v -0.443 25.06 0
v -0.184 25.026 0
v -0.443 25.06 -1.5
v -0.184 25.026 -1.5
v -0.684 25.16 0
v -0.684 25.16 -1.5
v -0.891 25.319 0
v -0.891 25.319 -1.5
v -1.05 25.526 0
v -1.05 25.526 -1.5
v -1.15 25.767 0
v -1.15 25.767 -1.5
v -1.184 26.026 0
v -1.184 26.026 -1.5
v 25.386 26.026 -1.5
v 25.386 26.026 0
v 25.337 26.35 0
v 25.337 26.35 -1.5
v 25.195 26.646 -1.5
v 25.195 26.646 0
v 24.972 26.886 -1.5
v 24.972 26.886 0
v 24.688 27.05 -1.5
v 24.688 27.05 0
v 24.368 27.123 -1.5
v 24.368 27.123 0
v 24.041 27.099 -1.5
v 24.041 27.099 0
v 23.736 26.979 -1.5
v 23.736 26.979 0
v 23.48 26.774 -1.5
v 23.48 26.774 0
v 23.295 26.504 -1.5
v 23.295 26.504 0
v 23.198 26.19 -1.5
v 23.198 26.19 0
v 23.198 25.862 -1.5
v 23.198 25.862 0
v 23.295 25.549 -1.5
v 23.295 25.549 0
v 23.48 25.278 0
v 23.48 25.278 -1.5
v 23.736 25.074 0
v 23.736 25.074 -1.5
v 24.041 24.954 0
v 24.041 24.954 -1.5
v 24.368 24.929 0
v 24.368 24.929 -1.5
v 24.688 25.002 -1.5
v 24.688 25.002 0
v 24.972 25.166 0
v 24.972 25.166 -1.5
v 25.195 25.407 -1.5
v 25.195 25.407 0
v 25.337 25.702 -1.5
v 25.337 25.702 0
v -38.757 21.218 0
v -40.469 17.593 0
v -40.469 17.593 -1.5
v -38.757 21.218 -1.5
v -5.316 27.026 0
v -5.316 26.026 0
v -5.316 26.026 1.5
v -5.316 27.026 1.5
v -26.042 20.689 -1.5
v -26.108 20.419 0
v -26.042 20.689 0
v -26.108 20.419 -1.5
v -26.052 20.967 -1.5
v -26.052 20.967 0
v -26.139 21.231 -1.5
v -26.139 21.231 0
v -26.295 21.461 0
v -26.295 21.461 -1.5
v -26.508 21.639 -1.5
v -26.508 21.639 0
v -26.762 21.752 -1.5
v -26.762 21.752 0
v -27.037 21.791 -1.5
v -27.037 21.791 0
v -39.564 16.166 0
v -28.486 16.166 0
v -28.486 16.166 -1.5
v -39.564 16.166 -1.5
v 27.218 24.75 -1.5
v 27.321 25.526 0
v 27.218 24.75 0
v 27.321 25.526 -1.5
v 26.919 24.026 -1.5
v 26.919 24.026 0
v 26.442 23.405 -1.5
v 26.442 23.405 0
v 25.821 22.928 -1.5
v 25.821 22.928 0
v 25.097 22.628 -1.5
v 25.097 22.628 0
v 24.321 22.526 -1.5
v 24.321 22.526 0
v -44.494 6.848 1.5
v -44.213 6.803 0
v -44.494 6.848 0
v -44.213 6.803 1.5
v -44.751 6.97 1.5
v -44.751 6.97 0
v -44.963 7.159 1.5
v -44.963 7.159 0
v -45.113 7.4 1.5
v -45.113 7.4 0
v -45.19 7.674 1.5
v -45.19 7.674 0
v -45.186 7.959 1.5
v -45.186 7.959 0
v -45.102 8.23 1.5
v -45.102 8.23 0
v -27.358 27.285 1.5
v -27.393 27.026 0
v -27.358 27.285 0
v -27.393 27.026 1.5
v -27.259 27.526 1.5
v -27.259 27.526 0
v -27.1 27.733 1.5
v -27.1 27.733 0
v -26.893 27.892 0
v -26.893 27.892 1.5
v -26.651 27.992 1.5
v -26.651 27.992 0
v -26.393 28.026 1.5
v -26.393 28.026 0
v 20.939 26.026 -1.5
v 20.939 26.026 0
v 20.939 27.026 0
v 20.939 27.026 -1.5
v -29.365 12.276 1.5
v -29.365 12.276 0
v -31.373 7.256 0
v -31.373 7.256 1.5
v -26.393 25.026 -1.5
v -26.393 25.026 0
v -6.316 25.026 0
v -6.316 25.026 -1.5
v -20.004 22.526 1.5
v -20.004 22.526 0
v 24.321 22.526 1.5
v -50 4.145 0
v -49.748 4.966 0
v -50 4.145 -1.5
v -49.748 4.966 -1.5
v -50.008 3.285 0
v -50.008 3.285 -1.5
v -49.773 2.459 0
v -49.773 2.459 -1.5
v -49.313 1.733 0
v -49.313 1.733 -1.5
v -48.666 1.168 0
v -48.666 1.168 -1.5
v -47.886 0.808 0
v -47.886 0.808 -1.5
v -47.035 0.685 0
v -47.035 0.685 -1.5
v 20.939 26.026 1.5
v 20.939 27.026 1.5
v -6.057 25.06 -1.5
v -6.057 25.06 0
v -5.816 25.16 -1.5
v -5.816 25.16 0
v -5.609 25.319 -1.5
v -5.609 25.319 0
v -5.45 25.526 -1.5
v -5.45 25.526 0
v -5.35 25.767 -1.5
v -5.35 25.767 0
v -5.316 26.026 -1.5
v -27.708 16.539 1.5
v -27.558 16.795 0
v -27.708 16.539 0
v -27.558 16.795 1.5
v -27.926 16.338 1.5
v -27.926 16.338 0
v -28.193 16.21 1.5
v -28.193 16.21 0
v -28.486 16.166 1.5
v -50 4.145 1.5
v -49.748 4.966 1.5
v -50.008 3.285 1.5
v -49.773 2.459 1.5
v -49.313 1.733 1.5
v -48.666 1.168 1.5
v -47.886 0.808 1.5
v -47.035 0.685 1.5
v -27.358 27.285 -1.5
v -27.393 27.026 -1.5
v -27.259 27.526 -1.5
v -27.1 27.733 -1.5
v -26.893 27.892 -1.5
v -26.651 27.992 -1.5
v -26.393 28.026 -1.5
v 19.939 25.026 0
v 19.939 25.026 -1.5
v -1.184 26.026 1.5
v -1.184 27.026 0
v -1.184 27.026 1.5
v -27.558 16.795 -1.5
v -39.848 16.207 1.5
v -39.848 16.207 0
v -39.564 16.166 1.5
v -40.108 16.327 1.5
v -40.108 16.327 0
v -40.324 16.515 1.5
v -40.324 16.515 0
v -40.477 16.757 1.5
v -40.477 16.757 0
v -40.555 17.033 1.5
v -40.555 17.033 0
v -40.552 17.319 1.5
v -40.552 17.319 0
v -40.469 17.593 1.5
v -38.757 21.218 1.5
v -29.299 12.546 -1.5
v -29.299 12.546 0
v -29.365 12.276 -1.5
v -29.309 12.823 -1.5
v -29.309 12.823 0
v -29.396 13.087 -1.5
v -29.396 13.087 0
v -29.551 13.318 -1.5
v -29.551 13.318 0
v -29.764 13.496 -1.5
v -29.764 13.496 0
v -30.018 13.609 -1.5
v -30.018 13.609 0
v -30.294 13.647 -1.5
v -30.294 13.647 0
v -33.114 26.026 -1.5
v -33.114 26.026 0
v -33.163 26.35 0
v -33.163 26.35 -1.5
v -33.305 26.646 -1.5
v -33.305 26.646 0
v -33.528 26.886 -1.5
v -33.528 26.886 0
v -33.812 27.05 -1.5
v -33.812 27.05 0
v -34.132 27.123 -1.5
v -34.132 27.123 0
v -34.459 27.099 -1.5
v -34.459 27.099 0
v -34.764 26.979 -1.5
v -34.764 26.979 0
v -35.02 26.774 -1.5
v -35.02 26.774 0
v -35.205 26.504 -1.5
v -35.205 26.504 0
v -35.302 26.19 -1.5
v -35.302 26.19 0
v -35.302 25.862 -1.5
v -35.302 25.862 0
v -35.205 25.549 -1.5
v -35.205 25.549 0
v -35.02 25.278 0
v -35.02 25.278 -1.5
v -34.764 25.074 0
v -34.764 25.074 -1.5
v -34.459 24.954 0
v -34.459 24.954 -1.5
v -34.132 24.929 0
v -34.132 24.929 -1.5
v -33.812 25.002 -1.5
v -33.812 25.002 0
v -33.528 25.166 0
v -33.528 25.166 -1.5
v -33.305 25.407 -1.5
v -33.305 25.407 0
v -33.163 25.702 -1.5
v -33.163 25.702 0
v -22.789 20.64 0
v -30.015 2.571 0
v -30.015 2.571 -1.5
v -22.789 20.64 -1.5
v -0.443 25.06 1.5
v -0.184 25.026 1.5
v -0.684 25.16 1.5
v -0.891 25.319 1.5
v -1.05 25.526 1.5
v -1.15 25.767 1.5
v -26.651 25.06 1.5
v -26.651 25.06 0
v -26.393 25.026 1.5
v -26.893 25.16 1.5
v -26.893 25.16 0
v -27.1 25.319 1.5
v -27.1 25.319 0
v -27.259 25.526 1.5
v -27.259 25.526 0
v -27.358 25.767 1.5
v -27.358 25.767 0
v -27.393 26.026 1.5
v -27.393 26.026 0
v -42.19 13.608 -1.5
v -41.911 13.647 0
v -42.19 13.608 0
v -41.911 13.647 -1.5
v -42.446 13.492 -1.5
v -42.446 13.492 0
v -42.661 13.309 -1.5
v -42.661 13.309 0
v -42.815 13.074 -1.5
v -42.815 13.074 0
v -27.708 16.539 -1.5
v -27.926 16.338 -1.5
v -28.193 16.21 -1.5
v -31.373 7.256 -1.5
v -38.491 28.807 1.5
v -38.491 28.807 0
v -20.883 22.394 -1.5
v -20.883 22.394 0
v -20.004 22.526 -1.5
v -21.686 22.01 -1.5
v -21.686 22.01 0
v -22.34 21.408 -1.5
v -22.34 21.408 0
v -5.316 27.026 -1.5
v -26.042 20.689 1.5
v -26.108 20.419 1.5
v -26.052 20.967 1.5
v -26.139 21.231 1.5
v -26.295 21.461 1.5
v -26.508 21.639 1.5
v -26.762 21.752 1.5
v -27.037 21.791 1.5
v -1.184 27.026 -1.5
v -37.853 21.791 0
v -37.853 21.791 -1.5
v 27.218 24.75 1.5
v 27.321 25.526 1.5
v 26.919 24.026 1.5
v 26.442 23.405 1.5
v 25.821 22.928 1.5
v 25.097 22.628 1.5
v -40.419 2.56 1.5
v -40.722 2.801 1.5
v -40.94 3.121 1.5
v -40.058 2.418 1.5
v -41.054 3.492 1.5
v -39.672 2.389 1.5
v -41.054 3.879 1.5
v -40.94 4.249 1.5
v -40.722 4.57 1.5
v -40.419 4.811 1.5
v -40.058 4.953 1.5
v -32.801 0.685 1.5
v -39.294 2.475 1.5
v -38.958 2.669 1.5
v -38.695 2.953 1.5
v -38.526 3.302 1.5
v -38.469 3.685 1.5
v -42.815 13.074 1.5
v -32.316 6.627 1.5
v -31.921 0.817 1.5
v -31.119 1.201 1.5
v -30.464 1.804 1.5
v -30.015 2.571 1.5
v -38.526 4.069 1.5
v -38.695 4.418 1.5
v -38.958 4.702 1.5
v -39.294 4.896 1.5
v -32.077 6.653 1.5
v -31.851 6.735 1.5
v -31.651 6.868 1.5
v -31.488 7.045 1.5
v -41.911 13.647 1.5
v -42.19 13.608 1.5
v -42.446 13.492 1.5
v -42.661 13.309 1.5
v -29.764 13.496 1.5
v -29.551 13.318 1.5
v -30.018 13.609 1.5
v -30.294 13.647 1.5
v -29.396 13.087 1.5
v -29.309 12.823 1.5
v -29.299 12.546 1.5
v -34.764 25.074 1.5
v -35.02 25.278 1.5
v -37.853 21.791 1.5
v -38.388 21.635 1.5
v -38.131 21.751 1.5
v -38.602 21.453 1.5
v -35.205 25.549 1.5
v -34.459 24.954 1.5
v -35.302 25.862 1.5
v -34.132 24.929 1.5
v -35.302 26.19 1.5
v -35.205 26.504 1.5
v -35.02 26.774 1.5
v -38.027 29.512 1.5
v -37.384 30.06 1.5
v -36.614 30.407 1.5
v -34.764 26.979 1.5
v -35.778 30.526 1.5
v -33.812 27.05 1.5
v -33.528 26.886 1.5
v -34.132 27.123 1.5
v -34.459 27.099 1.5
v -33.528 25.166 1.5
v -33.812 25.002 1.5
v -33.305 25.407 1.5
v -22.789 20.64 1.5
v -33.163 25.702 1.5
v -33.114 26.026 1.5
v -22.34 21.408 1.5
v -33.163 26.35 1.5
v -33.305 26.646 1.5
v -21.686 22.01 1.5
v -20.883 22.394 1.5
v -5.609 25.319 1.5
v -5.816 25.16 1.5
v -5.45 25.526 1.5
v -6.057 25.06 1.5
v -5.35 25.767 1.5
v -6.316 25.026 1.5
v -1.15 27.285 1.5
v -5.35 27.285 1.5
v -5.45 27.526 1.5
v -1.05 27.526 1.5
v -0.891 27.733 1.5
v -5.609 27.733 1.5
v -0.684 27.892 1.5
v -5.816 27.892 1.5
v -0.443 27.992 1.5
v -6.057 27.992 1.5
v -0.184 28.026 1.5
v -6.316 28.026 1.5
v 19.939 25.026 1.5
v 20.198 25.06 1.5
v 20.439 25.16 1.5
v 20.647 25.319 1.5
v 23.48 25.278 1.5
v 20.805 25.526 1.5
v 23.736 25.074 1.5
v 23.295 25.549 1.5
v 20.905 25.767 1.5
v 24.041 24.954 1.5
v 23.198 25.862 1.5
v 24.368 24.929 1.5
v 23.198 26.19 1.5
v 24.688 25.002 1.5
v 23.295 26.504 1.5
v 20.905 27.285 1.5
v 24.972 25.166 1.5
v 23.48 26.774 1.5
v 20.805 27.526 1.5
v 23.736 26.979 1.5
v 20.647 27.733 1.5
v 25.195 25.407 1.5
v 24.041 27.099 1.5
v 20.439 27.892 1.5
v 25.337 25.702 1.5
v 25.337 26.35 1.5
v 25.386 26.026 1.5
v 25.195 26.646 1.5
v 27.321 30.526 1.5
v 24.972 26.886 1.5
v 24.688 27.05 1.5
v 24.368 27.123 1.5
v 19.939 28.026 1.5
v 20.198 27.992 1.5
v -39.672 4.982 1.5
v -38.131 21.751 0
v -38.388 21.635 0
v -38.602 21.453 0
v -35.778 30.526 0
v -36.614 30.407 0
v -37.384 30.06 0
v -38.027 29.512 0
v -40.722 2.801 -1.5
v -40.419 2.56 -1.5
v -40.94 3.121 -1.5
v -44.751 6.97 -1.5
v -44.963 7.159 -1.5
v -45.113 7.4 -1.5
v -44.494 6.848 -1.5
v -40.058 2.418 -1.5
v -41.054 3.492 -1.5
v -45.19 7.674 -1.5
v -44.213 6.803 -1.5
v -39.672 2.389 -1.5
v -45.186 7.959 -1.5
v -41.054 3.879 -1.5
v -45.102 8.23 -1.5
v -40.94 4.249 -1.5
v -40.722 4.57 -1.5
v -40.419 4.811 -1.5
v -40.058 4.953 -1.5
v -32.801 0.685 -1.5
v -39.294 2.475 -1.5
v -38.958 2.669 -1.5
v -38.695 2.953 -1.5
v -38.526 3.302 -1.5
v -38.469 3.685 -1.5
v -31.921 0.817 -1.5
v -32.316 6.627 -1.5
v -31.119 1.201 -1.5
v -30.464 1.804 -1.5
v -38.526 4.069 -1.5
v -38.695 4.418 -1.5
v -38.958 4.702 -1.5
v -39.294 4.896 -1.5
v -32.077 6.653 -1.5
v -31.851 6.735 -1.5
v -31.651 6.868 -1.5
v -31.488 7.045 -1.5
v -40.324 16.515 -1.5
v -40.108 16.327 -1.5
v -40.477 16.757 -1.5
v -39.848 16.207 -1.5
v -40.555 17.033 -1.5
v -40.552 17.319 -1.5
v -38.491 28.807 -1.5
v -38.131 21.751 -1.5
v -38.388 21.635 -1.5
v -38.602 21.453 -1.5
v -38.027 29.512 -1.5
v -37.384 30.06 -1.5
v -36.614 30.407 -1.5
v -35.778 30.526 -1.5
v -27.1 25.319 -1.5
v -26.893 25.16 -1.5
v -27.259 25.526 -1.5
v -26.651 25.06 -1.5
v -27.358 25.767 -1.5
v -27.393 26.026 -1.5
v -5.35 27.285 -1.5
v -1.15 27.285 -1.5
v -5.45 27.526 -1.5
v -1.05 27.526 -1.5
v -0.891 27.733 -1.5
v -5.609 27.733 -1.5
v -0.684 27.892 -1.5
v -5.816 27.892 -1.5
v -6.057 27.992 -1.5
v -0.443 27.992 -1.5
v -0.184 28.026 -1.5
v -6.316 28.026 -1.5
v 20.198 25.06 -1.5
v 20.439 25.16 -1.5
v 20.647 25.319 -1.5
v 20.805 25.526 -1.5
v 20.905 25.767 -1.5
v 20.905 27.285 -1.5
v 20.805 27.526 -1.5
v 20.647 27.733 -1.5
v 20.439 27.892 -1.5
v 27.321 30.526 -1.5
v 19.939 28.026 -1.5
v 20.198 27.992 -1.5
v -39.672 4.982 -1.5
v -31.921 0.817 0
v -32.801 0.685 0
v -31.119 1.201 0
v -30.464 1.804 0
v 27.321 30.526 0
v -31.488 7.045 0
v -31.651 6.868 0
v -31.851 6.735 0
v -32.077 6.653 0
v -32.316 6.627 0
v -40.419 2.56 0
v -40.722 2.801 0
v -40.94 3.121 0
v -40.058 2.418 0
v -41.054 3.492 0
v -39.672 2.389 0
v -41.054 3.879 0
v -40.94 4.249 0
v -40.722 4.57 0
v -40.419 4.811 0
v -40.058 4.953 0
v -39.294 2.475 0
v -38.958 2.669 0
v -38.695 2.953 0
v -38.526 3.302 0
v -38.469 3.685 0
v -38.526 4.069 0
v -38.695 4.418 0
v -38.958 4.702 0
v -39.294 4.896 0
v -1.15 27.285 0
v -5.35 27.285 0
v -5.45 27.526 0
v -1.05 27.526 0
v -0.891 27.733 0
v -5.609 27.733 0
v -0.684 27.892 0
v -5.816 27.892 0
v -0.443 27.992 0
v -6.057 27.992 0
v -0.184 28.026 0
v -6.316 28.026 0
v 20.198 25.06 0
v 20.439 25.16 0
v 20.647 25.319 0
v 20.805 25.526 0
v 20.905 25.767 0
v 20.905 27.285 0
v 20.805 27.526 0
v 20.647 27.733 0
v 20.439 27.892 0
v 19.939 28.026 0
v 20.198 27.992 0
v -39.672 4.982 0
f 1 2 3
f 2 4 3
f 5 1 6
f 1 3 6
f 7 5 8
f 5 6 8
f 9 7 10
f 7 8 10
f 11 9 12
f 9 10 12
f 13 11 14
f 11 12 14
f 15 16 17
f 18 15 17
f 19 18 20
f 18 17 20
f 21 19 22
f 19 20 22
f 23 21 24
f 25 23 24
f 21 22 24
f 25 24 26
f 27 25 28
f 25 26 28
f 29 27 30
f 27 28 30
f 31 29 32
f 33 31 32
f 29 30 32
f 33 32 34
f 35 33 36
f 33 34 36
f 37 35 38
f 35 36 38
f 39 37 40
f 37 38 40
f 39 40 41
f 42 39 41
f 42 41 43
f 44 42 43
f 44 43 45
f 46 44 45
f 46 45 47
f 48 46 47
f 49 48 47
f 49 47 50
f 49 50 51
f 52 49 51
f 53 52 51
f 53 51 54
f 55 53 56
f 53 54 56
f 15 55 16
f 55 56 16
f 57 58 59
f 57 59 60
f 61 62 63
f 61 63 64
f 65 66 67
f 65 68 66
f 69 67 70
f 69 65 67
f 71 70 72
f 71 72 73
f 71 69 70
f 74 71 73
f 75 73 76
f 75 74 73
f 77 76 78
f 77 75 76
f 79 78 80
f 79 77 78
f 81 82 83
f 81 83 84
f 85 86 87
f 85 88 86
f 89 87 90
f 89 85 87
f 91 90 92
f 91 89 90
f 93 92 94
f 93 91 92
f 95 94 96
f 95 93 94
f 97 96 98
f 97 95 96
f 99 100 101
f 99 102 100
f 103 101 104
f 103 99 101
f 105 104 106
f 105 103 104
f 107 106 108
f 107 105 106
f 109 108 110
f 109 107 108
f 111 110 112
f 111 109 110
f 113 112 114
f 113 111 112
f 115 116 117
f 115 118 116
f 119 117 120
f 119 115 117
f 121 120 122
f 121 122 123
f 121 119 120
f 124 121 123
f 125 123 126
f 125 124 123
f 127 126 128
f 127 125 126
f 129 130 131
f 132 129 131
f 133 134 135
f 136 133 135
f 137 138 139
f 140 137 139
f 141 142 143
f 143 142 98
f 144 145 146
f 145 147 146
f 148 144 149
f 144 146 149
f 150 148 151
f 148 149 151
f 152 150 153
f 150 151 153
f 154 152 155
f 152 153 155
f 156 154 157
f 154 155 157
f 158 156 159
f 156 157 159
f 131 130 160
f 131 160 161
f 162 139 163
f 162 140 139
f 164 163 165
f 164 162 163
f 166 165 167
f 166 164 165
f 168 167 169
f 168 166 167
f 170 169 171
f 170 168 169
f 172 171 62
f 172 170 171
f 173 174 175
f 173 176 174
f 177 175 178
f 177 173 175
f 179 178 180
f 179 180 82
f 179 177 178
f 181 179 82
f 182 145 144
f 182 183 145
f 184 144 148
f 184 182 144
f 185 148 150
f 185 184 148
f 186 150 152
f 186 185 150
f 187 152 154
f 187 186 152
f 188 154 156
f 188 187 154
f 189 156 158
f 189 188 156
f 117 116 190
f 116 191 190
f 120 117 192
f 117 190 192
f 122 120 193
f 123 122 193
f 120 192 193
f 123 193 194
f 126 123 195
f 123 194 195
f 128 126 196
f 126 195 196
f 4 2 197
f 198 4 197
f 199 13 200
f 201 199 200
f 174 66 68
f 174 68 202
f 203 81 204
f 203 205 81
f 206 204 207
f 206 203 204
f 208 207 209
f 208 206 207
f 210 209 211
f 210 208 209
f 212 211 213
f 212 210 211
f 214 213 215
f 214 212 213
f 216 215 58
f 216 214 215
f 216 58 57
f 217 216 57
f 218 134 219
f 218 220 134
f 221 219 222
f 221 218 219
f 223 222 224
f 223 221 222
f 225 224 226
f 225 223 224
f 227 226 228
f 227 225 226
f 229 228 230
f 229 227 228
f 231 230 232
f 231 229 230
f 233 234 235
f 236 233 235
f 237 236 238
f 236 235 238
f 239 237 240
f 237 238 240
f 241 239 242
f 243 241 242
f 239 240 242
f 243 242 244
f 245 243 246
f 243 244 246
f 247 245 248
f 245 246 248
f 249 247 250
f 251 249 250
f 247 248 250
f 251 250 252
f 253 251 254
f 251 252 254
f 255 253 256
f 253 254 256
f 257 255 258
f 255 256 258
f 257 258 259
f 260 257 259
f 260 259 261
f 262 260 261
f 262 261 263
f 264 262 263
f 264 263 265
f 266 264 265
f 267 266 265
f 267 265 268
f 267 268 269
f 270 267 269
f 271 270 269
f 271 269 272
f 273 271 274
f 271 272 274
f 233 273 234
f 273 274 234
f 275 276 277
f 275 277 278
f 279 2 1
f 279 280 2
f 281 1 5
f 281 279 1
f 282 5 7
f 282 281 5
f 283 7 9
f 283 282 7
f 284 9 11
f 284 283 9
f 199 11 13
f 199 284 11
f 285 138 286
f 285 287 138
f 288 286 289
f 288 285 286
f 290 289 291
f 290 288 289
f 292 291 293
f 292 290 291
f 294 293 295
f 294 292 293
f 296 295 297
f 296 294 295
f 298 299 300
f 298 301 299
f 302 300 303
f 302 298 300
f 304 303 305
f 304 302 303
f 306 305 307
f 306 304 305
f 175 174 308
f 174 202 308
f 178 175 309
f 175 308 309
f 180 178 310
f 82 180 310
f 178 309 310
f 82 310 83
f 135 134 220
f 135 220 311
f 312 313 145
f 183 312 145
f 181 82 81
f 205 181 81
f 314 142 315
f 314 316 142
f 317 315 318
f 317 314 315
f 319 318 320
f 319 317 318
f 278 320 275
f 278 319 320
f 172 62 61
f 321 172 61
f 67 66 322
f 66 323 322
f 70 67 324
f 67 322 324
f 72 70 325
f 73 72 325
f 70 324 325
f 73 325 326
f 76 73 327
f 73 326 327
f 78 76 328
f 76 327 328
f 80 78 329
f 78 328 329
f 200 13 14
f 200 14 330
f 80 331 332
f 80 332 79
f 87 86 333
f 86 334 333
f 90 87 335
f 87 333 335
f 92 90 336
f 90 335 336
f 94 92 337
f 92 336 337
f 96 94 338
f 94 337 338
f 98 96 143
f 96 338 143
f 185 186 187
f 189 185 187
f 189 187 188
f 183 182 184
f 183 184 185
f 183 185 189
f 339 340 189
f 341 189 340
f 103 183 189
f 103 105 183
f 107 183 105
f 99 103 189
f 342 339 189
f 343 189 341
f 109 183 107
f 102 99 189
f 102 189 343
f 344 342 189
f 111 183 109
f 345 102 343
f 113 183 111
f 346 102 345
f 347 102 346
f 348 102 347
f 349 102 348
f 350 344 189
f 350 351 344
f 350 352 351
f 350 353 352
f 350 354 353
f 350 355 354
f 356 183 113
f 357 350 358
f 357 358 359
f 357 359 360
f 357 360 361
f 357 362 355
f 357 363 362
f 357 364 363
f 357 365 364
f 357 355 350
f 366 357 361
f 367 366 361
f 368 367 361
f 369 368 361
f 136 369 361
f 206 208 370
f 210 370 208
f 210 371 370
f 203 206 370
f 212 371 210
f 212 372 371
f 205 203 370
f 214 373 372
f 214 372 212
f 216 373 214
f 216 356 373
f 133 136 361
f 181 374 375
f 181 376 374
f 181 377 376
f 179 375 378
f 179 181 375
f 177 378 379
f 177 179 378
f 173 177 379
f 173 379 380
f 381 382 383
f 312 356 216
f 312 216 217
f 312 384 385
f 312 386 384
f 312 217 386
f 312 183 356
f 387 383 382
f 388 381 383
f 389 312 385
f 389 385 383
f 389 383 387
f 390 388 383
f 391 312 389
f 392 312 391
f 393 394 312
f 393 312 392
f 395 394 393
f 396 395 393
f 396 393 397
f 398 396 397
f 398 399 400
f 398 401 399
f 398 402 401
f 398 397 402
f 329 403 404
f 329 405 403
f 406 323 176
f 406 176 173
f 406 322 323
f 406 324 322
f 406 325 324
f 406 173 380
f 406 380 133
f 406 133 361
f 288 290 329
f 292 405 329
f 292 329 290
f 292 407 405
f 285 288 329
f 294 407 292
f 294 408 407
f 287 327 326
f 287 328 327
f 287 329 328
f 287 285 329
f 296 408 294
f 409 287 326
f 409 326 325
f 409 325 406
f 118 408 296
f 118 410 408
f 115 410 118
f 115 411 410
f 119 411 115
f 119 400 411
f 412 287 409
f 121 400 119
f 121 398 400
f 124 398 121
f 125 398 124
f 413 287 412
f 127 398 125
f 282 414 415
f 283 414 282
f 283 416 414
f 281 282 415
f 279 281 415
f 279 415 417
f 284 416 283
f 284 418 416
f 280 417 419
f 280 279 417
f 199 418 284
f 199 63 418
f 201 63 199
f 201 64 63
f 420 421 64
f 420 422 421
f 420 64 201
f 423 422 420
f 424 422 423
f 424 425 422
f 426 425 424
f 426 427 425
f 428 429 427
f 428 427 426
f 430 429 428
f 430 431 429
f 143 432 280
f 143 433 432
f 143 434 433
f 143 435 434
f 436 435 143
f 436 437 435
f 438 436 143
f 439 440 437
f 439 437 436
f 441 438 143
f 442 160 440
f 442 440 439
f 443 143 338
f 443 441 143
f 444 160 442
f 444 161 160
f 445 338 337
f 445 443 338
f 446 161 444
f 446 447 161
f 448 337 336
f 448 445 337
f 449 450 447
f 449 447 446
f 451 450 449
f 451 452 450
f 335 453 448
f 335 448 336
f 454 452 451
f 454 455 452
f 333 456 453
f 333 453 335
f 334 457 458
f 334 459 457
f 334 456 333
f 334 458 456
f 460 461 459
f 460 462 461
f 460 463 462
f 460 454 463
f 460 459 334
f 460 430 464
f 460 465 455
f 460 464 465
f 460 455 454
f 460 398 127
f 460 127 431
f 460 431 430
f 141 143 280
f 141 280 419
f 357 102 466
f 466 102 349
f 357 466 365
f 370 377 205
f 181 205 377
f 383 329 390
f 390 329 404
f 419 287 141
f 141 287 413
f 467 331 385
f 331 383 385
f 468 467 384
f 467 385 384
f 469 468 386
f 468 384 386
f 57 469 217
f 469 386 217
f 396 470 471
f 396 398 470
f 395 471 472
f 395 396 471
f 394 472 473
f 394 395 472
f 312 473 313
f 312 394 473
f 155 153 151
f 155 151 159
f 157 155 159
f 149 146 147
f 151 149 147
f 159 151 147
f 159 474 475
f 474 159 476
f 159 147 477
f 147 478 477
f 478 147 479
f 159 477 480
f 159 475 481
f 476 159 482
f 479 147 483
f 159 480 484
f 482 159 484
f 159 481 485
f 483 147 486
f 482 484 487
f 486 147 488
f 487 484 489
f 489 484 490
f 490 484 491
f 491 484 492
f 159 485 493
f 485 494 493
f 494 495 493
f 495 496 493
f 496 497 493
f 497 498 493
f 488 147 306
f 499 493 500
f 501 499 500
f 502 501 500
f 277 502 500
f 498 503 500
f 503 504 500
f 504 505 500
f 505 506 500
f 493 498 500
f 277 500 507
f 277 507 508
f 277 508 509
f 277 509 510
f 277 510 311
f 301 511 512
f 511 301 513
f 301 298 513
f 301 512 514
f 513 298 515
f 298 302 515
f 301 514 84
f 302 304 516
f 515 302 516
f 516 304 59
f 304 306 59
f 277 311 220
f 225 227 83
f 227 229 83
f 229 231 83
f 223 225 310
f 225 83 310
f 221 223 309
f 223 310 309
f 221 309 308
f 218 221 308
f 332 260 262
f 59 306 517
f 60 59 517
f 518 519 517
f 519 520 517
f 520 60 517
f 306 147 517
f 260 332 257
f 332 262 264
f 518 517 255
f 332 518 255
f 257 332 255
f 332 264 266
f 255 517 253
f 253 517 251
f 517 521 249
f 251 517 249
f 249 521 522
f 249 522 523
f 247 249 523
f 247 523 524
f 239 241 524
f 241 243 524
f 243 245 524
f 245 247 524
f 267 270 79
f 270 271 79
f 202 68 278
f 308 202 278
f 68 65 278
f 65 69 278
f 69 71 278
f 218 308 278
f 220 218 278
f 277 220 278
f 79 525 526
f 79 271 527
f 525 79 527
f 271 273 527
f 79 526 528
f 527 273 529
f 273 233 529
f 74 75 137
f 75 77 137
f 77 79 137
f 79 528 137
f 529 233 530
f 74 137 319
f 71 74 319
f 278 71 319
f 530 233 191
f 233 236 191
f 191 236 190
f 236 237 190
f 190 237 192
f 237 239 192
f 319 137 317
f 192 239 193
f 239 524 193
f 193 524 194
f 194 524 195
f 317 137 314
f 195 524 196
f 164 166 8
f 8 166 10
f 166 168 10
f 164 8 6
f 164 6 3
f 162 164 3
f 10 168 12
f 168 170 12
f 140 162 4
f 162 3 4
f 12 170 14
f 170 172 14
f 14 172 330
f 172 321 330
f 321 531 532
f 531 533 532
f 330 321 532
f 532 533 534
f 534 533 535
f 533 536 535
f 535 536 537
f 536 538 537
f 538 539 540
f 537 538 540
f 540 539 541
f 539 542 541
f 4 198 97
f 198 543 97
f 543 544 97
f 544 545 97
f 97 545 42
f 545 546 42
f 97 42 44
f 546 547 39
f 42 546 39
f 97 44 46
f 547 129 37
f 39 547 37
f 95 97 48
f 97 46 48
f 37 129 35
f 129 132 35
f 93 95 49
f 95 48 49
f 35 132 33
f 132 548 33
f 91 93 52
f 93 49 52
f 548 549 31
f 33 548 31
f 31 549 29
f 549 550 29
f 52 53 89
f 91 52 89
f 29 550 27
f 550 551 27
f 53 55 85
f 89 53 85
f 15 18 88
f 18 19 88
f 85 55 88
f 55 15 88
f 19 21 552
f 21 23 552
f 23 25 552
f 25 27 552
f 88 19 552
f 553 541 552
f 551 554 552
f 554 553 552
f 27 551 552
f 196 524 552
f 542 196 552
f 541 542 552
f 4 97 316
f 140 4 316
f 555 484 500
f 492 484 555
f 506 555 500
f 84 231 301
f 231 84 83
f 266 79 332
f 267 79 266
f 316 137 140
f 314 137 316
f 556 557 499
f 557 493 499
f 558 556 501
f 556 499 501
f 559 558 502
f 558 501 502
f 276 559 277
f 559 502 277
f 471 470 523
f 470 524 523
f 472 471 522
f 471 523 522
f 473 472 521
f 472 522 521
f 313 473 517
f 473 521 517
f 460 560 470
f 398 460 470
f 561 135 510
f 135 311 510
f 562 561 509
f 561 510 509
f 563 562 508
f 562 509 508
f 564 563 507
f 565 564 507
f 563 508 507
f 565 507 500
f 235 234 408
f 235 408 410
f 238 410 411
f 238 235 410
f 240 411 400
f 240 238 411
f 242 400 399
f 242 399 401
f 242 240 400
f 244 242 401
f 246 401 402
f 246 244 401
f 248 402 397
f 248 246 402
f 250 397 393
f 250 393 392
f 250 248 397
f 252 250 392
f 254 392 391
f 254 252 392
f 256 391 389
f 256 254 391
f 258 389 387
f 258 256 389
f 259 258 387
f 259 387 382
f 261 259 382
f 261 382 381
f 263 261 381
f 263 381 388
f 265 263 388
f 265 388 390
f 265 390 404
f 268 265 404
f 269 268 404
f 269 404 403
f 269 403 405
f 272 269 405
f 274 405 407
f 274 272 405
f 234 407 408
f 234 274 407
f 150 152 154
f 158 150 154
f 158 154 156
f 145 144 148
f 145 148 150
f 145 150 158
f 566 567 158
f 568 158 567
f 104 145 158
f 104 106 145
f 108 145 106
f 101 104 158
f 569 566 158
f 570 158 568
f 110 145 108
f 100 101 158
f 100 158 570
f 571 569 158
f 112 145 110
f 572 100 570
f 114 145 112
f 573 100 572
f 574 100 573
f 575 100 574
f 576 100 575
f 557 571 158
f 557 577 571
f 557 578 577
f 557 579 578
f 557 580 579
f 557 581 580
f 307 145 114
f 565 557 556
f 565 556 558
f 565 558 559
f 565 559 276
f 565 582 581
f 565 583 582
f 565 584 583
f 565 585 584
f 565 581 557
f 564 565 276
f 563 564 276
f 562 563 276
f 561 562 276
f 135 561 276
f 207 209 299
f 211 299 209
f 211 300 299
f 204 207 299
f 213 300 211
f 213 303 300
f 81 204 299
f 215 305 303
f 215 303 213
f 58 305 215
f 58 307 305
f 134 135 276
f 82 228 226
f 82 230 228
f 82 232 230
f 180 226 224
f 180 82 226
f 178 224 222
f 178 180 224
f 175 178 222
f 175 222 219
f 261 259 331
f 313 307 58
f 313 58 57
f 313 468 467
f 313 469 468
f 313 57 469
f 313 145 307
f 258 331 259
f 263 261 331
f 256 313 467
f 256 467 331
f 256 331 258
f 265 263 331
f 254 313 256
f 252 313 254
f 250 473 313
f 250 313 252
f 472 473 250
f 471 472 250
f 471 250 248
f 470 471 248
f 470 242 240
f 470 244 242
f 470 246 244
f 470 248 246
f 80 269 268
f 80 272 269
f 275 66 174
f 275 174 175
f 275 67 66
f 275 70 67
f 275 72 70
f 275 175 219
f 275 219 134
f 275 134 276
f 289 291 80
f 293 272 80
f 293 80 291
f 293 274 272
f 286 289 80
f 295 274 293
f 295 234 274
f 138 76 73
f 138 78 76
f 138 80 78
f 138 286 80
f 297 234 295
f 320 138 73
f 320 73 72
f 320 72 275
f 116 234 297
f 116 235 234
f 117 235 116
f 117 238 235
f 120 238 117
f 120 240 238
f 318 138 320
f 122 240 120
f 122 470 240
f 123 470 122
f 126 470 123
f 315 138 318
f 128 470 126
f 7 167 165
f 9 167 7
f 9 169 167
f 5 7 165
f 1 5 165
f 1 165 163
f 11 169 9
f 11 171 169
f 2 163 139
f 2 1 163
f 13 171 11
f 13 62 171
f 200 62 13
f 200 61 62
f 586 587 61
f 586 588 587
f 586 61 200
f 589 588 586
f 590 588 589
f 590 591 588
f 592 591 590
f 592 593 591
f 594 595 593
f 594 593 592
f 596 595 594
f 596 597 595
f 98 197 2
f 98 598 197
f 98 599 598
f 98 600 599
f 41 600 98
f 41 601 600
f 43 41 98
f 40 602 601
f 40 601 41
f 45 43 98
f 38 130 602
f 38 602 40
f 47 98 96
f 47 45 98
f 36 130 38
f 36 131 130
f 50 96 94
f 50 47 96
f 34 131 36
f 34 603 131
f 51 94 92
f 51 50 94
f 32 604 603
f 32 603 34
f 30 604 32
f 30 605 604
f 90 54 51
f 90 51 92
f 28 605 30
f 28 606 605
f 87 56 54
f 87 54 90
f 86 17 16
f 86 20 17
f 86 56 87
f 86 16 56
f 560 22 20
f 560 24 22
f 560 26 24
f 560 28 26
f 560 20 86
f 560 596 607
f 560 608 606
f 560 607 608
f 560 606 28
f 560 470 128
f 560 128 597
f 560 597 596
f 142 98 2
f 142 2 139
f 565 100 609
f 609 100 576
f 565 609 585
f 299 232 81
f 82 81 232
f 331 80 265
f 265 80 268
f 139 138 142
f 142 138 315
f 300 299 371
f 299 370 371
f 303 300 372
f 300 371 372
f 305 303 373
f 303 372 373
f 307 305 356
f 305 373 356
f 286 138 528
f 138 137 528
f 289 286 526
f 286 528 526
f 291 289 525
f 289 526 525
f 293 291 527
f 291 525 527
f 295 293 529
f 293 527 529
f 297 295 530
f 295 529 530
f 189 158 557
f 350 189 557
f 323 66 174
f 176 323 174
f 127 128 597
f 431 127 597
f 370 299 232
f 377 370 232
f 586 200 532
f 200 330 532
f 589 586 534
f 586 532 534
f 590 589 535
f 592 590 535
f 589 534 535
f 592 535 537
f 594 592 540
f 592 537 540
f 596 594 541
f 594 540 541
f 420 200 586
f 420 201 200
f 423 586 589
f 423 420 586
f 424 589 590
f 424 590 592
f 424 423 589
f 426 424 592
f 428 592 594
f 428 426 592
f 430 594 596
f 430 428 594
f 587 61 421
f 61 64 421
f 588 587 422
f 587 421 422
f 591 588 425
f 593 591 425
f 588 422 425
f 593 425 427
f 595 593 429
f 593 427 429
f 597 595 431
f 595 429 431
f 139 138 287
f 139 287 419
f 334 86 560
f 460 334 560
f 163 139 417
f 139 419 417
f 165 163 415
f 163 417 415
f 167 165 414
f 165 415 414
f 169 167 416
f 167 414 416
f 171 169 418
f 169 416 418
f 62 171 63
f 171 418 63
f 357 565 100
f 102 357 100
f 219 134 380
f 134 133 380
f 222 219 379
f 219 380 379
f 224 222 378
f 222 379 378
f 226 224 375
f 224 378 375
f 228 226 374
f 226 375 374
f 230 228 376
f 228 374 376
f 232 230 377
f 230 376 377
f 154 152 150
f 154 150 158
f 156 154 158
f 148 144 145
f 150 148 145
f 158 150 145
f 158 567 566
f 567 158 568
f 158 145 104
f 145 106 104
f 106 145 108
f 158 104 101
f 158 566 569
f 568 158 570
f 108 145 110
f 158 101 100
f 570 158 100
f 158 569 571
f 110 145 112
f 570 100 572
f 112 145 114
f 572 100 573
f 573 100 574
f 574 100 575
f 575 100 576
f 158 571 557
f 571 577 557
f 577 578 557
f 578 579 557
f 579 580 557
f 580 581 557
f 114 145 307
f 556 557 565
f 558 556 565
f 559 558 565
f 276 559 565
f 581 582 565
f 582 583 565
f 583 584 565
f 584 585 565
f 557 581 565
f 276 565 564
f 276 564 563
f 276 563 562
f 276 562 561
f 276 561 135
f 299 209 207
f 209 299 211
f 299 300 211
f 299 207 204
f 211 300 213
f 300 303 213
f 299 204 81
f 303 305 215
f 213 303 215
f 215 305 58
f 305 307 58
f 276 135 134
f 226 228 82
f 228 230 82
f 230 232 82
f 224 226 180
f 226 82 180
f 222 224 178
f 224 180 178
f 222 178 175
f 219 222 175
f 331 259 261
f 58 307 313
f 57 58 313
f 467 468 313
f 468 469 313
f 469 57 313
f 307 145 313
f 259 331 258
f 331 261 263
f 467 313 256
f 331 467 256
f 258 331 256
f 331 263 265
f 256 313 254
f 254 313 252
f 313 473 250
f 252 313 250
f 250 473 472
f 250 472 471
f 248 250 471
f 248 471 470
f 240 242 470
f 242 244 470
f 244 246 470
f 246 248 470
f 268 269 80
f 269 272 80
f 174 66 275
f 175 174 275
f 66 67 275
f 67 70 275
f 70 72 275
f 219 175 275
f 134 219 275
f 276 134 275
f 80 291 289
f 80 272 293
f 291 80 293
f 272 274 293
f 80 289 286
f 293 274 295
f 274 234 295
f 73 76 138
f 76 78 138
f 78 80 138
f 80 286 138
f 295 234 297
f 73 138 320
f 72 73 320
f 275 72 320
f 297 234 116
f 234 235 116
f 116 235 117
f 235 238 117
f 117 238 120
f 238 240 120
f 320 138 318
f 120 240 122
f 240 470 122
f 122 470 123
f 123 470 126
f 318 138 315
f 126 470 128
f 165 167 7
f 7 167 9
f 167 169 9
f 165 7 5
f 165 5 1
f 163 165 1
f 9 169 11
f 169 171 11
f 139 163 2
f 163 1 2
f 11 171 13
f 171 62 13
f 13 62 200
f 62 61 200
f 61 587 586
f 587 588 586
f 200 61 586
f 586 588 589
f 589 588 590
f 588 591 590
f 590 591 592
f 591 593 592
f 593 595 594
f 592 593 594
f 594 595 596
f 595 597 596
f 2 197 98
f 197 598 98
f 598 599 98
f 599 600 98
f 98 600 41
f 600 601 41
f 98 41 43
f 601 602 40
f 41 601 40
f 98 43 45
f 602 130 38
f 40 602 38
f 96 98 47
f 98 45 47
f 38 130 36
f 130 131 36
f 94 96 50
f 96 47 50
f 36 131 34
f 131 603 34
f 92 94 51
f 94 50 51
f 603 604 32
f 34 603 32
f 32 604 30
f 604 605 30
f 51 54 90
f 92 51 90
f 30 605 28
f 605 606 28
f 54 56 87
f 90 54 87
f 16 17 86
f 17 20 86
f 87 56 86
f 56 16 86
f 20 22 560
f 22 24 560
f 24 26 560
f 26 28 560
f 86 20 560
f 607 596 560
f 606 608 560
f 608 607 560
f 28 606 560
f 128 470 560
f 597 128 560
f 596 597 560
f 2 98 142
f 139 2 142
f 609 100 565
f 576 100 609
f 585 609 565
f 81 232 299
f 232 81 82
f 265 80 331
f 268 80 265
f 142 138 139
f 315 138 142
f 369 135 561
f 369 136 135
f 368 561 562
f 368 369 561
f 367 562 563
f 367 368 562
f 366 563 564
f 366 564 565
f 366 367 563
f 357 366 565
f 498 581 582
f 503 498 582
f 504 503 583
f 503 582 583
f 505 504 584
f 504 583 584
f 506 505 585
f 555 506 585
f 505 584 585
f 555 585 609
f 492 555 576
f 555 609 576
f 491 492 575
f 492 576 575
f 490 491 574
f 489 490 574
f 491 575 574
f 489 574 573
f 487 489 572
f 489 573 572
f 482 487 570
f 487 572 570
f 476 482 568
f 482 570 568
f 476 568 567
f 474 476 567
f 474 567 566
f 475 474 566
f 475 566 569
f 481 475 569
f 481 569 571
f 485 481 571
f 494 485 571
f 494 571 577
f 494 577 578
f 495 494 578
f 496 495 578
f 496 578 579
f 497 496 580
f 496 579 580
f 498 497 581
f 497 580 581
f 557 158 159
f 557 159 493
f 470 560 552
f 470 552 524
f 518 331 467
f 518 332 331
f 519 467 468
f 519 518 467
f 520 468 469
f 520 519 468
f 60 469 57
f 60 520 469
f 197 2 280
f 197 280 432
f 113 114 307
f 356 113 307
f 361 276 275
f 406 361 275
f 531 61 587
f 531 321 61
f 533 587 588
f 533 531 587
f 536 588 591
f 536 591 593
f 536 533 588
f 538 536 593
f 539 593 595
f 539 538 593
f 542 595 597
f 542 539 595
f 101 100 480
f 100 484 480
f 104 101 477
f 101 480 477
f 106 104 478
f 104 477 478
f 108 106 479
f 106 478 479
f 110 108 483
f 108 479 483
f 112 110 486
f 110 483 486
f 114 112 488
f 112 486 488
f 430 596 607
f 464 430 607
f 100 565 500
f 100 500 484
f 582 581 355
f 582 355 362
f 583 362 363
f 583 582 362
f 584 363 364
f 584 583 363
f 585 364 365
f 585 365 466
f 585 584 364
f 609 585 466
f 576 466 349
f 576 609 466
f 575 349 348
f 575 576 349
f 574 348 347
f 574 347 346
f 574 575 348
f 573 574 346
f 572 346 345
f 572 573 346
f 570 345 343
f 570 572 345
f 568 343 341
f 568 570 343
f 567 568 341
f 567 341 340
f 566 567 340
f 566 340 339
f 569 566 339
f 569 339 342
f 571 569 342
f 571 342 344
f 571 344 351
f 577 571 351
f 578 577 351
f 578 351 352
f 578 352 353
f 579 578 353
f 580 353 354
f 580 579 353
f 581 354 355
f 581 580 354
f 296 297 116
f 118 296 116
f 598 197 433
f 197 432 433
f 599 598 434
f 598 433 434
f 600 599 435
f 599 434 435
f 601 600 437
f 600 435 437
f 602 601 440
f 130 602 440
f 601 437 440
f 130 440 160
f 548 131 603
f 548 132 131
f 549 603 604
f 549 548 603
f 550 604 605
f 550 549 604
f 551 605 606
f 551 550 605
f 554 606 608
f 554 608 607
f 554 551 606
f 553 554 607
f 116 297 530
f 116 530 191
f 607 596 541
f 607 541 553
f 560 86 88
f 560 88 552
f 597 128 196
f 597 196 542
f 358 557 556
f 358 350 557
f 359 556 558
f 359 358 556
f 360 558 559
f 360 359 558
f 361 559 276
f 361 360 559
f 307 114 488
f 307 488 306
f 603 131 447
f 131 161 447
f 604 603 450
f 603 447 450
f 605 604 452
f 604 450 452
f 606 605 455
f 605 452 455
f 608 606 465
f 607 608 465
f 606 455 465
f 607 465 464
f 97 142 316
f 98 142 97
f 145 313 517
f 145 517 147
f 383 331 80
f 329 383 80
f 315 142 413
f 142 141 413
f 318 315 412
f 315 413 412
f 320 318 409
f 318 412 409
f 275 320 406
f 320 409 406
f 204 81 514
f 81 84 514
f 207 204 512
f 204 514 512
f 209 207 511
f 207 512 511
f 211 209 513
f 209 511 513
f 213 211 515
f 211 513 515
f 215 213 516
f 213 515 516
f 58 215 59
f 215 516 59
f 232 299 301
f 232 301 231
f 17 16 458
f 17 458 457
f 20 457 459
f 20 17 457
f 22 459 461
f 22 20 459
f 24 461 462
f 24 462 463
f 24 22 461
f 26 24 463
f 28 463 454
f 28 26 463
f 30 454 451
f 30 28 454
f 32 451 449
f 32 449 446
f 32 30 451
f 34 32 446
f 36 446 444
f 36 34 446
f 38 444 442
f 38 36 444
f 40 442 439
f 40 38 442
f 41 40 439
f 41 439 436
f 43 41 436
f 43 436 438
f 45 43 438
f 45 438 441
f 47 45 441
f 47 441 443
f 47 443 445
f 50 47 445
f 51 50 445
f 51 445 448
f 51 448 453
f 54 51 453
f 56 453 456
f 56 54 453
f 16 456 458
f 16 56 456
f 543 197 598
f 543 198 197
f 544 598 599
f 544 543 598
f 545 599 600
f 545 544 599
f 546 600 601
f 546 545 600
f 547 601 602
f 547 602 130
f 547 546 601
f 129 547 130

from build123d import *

# Parameters (mm, degrees)
F0_R     = 1.3
F0_R_2   = 1.1
F0_W     = 22.076766
F0_H     = 3
F0_W_2   = 22.123311
F1_DEPTH = 1.5
F2_R     = 3
F3_R     = 1


with BuildPart() as f1:
    # F0 (on Top) → F1 (new body)
    with BuildSketch(Plane.XY):
        Polygon((27.320505, 30.526263), (-37.679495, 30.526263), (-51.769257, 0.685375), (-30.769257, 0.685375), (-22.0348, 22.526263), (27.320505, 22.526263), align=None)
        with Locations((-39.768699, 3.685375)):
            Circle(F0_R, mode=Mode.SUBTRACT)
        Polygon((-31.628012, 6.617281), (-45.765303, 6.826442), (-42.544752, 13.647289), (-28.81662, 13.647289), align=None, mode=Mode.SUBTRACT)
        Polygon((-27.809364, 16.165975), (-41.142295, 16.165975), (-38.486495, 21.790729), (-25.559951, 21.790729), align=None, mode=Mode.SUBTRACT)
        with Locations((-34.213918, 26.026263)):
            Circle(F0_R_2, mode=Mode.SUBTRACT)
        with Locations((-16.354163, 26.526263)):
            Rectangle(F0_W, F0_H, mode=Mode.SUBTRACT)
        with Locations((9.877762, 26.526263)):
            Rectangle(F0_W_2, F0_H, mode=Mode.SUBTRACT)
        with Locations((24.286082, 26.026263)):
            Circle(F0_R_2, mode=Mode.SUBTRACT)
    extrude(amount=F1_DEPTH)

    # F2
    f2_edges = [f1.edges().sort_by_distance(p)[0] for p in [
        (-22.0348, 22.526263, 0.75),
        (-37.679495, 30.526263, 0.75),
        (-51.769257, 0.685375, 0.75),
        (-30.769257, 0.685375, 0.75),
        (27.320505, 22.526263, 0.75),
    ]]
    fillet(f2_edges, radius=F2_R)

    # F3
    f3_edges = [f1.edges().sort_by_distance(p)[0] for p in [
        (-45.765303, 6.826442, 0.75),
        (-42.544752, 13.647289, 0.75),
        (-28.81662, 13.647289, 0.75),
        (-31.628012, 6.617281, 0.75),
        (-27.809364, 16.165975, 0.75),
        (-25.559951, 21.790729, 0.75),
        (-38.486495, 21.790729, 0.75),
        (-41.142295, 16.165975, 0.75),
        (-27.392546, 25.026263, 0.75),
        (-27.392546, 28.026263, 0.75),
        (-5.31578, 28.026263, 0.75),
        (-5.31578, 25.026263, 0.75),
        (20.939417, 25.026263, 0.75),
        (20.939417, 28.026263, 0.75),
        (-1.183894, 25.026263, 0.75),
        (-1.183894, 28.026263, 0.75),
    ]]
    fillet(f3_edges, radius=F3_R)


with BuildPart() as f4_1:
    # F4: instance of F1
    add(f1.part.mirror(Plane.XY))


solid = Compound([f1.part, f4_1.part])
